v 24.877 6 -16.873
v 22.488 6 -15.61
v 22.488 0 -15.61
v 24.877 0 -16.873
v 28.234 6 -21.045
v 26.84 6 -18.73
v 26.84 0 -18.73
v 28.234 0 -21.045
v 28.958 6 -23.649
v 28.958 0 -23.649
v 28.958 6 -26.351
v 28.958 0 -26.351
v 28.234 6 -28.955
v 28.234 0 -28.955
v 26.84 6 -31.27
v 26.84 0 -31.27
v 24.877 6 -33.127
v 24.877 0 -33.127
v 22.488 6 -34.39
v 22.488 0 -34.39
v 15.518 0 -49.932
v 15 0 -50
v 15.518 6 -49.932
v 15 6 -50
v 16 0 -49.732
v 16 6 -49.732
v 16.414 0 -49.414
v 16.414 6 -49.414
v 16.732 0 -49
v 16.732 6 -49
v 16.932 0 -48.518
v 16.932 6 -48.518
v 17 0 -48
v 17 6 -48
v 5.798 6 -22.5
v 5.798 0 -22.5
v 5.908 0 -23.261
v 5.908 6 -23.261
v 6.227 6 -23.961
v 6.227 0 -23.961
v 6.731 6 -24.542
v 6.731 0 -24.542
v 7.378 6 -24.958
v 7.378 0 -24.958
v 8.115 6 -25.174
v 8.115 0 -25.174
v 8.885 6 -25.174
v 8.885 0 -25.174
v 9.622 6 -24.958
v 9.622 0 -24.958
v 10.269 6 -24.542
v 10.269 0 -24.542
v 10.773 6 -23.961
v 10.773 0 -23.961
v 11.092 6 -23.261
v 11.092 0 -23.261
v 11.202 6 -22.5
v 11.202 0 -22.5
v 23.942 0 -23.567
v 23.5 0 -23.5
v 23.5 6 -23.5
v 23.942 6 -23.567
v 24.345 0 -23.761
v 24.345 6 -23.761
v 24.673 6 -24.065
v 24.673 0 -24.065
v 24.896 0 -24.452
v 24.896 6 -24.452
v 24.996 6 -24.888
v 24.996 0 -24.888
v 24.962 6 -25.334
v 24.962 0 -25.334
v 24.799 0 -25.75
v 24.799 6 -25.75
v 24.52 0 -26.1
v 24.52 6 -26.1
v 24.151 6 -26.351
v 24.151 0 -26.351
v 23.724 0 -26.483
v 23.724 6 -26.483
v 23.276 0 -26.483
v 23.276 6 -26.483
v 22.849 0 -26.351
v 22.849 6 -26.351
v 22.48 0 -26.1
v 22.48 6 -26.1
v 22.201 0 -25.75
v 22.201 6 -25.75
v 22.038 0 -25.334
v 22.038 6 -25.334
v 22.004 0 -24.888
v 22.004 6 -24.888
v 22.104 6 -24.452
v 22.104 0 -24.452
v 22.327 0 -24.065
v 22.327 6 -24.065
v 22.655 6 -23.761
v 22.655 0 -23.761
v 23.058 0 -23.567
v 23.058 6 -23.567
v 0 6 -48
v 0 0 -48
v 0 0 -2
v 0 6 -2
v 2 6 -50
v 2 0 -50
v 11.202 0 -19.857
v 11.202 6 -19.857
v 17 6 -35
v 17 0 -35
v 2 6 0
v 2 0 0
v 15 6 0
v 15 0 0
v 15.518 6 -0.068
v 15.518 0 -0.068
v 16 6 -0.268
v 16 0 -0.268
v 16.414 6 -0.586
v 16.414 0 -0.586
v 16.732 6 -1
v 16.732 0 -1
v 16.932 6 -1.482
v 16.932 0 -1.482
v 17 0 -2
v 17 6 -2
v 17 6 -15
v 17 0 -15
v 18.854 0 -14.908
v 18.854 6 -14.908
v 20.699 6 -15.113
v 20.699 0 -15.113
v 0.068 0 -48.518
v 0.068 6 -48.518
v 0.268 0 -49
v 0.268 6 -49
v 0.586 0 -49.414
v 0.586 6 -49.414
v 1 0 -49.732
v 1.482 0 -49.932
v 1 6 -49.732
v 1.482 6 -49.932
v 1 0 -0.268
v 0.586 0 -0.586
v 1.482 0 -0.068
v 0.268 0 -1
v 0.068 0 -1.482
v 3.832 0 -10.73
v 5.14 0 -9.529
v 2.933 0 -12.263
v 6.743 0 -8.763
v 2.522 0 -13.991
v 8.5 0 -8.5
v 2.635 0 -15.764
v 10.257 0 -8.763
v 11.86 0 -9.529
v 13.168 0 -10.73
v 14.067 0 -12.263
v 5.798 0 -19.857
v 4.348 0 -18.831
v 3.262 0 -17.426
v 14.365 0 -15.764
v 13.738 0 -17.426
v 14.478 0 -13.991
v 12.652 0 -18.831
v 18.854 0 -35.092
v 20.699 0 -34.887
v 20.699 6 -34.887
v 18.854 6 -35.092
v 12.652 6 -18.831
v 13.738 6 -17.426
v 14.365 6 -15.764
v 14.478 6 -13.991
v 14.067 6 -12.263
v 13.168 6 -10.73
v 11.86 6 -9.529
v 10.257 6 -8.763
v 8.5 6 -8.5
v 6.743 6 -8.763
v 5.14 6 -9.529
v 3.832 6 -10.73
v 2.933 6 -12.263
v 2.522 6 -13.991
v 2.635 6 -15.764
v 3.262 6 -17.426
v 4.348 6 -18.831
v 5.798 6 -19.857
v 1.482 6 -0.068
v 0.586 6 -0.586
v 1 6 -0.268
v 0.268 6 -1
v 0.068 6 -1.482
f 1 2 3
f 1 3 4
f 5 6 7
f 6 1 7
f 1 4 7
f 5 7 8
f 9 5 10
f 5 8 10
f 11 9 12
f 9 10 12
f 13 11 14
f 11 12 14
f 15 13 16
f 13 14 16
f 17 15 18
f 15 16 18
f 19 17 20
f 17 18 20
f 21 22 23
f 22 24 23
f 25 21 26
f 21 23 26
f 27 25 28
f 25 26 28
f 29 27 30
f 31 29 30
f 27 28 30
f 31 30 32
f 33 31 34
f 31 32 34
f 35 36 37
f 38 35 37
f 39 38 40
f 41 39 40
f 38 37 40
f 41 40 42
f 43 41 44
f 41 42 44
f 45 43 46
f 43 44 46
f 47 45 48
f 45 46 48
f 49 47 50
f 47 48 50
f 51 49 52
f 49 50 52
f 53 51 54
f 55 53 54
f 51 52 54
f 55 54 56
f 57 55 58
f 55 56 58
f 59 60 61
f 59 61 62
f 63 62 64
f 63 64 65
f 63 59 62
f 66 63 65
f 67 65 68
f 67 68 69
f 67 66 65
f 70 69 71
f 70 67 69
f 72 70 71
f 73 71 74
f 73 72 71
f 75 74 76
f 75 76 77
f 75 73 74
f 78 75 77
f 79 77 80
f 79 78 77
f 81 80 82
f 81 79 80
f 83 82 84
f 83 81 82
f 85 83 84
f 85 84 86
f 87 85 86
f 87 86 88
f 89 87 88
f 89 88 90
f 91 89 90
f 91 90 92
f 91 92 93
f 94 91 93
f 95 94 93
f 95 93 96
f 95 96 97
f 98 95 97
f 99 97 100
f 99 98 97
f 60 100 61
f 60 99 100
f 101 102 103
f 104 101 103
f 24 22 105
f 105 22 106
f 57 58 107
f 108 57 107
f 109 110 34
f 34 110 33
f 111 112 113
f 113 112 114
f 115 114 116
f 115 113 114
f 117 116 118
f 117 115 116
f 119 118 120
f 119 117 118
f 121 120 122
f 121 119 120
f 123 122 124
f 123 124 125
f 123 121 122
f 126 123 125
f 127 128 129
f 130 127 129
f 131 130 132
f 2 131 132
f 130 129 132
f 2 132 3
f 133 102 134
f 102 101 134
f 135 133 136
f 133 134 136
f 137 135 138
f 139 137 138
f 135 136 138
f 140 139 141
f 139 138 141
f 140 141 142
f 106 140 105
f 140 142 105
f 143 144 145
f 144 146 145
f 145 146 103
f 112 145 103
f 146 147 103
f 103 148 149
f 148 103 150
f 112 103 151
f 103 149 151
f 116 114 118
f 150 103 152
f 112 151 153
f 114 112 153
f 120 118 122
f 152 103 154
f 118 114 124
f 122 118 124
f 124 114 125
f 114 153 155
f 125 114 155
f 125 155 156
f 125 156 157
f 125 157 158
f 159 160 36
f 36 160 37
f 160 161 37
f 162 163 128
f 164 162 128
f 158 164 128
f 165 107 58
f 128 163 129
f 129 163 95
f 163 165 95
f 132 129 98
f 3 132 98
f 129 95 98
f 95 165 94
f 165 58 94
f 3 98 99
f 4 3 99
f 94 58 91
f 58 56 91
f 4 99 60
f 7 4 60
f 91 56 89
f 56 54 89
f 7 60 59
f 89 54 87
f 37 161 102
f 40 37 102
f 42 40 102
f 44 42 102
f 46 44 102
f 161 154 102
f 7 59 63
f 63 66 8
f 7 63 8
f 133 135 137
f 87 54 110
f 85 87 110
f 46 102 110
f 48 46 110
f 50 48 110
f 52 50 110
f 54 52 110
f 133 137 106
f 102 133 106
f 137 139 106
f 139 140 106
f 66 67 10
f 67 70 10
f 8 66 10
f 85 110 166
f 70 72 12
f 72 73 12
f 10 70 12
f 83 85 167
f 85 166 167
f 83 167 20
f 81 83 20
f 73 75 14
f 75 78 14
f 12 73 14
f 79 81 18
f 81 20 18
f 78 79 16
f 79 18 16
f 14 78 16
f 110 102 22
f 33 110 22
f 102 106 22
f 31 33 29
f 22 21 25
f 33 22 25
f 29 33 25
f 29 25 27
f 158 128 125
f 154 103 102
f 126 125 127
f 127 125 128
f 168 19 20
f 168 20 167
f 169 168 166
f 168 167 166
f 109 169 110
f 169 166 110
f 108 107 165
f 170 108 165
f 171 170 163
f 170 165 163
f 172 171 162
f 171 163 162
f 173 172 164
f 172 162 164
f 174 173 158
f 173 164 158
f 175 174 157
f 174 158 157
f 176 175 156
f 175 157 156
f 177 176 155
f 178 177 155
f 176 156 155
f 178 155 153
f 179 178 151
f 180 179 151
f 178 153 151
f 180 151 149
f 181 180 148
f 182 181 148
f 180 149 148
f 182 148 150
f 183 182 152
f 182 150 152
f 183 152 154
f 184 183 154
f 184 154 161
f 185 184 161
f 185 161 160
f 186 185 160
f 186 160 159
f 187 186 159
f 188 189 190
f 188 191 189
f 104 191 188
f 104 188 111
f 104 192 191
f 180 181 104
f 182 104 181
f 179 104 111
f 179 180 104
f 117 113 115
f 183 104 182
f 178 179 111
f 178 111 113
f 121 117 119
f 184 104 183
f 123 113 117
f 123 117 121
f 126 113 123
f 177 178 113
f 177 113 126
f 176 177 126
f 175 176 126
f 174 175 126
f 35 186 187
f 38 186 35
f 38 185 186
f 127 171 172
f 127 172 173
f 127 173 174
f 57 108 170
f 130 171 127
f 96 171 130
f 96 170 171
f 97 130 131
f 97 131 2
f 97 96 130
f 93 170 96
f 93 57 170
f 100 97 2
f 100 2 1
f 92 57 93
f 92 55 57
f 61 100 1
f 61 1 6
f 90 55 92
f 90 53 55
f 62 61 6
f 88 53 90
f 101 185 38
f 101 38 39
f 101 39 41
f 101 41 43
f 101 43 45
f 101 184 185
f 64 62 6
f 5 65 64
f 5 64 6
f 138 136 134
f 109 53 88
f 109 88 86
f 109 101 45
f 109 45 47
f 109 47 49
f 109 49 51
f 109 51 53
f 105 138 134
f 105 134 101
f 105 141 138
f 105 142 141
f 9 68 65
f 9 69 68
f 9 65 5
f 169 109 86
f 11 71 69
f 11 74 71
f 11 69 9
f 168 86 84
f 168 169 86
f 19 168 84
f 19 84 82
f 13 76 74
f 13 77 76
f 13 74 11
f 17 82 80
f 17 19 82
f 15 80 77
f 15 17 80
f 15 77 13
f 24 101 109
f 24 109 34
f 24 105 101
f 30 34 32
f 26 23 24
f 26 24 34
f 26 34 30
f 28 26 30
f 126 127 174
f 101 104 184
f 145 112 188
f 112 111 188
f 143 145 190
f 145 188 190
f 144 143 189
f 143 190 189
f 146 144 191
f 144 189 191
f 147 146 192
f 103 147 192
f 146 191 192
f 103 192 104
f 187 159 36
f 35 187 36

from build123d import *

# Parameters (mm, degrees)
ESQUISSE1_R        = 1.5
BOSS_EXTRU_2_DEPTH = 6
CONG_2_R           = 2
CONG_3_R           = 10


with BuildPart() as part:
    # Esquisse1 → Boss.-Extru.2 (new body)
    with BuildSketch(Plane(origin=(0, 0, 0), x_dir=(1, 0, 0), z_dir=(0, 1, 0))):
        with BuildLine():
            Line((0, 0), (17, 0))
            Line((17, 0), (17, 15))
            ThreePointArc((17, 15), (25.571067812, 17.307611845), (30, 25))
            ThreePointArc((30, 25), (25.571067812, 32.692388155), (17, 35))
            Line((17, 35), (17, 50))
            Line((17, 50), (0, 50))
            Line((0, 50), (0, 0))
        make_face()
        with BuildLine():
            ThreePointArc((5.798134367, 22.5), (8.5, 25.201865633), (11.201865633, 22.5))
            Line((11.201865633, 22.5), (11.201865633, 19.857230824))
            ThreePointArc((11.201865633, 19.857230824), (8.5, 8.5), (5.798134367, 19.857230824))
            Line((5.798134367, 19.857230824), (5.798134367, 22.5))
        make_face(mode=Mode.SUBTRACT)
        with Locations(Location((23.5, 25, 0), (0, 0, 270))):
            Circle(ESQUISSE1_R, mode=Mode.SUBTRACT)
    extrude(amount=BOSS_EXTRU_2_DEPTH)

    # Congé2
    cong_2_edges = [part.edges().sort_by_distance(p)[0] for p in [
        (17, 3, 0),
        (0, 3, 0),
        (0, 3, -50),
        (17, 3, -50),
    ]]
    fillet(cong_2_edges, radius=CONG_2_R)

    # Congé3
    # the kernel refuses this fillet: 10 mm, written as the material it takes off along each edge
    with BuildSketch(Plane(origin=(30, -30.063050545, -25), x_dir=(-0.6246887700874293, 0, 0.7808738313752451), z_dir=(0, 1, 0))) as cong_3_piece_1:
        with BuildLine():
            CenterArc((6.840779647, -8.551115481), CONG_3_R, 58.772060321, 139.774574658)
            ThreePointArc((-2.639871114, -11.731879721), (-2.959277225, -5.497060293), (0, 0))
            ThreePointArc((0, 0), (6.012610109, 1.680331289), (12.025220218, 0))
        make_face()
    extrude(amount=66.126101089, mode=Mode.SUBTRACT)


solid = part.part
